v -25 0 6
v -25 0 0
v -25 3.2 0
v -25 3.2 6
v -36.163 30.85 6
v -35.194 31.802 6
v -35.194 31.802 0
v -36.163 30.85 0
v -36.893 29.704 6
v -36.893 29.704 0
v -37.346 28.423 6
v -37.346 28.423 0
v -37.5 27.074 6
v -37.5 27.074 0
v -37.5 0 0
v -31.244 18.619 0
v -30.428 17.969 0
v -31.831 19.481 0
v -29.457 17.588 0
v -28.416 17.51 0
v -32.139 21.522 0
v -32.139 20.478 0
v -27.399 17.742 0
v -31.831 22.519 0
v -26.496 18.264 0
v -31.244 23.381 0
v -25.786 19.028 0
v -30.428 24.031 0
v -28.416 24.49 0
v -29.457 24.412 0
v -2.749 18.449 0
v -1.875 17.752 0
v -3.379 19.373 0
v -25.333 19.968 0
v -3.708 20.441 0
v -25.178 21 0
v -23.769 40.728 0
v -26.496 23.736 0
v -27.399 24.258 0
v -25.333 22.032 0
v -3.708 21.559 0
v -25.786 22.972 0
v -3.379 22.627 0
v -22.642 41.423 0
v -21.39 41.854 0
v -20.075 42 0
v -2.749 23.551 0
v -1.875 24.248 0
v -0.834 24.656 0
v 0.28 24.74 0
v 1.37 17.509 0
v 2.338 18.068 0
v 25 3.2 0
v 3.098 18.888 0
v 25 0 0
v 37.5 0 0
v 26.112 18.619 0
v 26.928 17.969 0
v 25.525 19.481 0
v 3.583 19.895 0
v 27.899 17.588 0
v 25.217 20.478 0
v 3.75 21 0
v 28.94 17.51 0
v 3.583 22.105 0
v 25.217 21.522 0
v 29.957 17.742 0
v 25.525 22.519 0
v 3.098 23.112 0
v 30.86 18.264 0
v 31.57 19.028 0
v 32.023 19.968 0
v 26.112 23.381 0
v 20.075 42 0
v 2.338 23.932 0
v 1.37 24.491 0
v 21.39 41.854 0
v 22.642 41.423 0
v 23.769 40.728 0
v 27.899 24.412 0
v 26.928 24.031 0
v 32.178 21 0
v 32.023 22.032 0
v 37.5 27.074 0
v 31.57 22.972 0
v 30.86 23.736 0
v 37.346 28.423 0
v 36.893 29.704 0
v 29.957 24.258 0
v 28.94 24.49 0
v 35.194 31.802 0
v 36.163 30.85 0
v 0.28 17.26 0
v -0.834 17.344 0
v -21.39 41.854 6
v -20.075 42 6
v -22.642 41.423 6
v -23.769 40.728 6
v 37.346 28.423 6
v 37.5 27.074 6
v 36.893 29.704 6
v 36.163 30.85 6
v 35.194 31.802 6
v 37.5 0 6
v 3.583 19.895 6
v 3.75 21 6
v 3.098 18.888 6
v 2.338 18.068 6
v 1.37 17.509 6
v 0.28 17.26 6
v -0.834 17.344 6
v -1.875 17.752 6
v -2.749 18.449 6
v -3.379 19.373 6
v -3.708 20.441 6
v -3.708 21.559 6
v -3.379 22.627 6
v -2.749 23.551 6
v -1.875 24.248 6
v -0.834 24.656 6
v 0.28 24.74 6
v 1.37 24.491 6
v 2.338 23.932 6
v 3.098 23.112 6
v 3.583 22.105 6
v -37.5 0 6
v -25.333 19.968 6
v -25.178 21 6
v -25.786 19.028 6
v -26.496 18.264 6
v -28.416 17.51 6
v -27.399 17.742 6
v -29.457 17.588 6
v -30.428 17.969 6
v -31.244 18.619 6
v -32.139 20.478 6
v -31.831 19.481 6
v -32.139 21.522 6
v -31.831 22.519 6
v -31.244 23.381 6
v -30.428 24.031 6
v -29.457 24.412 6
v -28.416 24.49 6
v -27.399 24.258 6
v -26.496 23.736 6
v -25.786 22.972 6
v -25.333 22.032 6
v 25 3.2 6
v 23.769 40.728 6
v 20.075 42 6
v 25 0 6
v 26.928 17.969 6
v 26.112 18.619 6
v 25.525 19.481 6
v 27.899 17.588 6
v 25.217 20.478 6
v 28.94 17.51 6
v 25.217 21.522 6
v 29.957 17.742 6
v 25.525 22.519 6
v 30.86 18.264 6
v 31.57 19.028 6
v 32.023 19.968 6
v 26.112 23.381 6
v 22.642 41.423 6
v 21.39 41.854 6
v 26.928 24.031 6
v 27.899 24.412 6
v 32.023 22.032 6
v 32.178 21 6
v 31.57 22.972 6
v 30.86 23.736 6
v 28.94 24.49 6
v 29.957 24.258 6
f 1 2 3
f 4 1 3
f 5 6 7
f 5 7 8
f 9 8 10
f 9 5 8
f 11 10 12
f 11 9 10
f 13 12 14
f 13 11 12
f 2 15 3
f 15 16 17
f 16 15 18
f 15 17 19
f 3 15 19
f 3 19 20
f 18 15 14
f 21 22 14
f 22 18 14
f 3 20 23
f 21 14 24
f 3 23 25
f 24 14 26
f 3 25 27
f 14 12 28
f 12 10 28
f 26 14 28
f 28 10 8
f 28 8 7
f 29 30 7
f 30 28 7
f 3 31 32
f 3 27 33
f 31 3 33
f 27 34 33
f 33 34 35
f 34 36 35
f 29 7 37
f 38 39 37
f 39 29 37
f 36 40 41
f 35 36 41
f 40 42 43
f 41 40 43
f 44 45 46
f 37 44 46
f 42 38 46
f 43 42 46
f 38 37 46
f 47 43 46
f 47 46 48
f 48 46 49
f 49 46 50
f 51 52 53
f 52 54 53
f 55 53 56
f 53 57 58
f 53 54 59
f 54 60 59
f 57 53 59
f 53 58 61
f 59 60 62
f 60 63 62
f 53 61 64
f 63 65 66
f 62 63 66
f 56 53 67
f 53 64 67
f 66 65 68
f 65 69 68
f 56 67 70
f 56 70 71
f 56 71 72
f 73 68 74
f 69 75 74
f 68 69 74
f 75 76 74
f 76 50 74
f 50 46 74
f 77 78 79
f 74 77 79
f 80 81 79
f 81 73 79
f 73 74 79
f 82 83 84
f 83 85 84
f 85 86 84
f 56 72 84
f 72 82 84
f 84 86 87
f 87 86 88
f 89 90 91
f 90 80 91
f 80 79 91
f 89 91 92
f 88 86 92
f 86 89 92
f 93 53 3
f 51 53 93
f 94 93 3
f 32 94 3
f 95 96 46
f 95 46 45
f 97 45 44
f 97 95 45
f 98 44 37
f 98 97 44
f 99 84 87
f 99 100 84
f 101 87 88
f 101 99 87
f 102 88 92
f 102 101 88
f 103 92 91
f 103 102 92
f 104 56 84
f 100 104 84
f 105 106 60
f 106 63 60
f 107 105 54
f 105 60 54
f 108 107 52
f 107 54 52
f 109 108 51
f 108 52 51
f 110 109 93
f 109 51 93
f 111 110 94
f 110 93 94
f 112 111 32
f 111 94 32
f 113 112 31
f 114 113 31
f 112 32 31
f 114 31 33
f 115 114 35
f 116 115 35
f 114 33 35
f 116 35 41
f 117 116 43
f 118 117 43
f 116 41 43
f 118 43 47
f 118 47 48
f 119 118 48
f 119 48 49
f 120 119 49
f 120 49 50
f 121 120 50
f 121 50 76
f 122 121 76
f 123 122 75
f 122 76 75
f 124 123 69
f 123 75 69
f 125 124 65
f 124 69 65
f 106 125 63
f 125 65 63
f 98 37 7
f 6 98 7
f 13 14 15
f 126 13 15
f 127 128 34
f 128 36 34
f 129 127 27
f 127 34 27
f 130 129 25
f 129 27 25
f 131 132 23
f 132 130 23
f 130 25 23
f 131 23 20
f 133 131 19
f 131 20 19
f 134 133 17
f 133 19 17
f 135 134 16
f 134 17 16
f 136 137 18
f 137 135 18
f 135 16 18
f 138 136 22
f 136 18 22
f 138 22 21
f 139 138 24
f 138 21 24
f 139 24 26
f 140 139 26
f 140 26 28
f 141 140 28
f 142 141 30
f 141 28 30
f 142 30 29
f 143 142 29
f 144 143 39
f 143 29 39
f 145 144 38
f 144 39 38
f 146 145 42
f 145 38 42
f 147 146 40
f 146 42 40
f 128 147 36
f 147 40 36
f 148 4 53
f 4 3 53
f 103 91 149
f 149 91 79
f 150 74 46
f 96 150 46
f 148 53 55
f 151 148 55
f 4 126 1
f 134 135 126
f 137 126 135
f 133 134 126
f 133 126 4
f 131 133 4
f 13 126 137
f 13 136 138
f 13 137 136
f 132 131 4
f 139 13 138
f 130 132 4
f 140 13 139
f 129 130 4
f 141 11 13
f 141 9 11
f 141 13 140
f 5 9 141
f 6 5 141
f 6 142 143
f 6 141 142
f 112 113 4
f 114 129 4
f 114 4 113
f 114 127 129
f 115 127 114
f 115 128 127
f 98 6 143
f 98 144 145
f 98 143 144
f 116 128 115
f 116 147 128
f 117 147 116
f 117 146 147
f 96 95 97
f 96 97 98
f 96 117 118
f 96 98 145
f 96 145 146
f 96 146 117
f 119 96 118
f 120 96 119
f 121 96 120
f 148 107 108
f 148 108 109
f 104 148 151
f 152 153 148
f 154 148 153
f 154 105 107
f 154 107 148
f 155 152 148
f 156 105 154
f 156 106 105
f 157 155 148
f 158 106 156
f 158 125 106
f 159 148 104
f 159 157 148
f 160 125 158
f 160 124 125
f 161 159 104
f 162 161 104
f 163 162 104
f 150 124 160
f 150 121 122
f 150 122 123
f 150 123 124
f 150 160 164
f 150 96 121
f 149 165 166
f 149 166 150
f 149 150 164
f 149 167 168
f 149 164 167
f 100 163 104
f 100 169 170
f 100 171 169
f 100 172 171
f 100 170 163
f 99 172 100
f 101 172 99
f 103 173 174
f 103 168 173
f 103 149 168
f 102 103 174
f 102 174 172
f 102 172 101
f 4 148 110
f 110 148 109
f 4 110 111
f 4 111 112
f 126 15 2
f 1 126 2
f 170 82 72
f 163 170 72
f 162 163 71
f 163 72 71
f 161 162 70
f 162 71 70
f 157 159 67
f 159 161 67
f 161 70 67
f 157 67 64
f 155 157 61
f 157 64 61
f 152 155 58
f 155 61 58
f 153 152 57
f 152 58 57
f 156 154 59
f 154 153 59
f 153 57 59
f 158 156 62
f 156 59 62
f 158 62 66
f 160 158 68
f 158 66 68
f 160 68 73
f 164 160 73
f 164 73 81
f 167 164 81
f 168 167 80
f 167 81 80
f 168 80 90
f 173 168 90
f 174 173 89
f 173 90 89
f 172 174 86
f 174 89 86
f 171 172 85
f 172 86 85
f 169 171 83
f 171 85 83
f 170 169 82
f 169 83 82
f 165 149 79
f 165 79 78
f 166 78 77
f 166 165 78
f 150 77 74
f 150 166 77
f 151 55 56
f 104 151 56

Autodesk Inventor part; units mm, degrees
ref_plane "YZ Plane" through (0, 0, 0) normal (1, 0, 0) x (0, 1, 0)
ref_plane "XZ Plane" through (0, 0, 0) normal (0, 1, 0) x (-1, 0, 0)
ref_plane "XY Plane" through (0, 0, 0) normal (0, 0, 1) x (1, 0, 0)
sketch "Sketch1" plane through (0, 0, 0) normal (0, 0, 1) x (1, 0, 0)
  line L0 (37.5, 0) -> (37.5, 30)
  line L1 (37.5, 30) -> (22.1407, 42)
  line L2 (22.1407, 42) -> (-22.1407, 42)
  line L3 (-22.1407, 42) -> (-37.5, 30)
  line L4 (-37.5, 30) -> (-37.5, 0)
  circle A0 centre (-28.678, 21) radius 3.5
  circle A1 centre (28.678, 21) radius 3.5
  circle A2 centre (0, 21) radius 3.75
  line L5 (-37.5, 0) -> (-25, 0)
  line L6 (-25, 0) -> (-25, 3.2)
  line L7 (-25, 3.2) -> (25, 3.2)
  line L8 (25, 3.2) -> (25, 0)
  line L9 (25, 0) -> (37.5, 0)
  line L10 (0, -8.4) -> (0, 50.4) projected
  line L11 (-52.5, 0) -> (52.5, 0) projected
  point P0 (0, 0)
  point P1 (0, 42)
  point P2 (0, 0)
  dimension "d0" = 30
  dimension "d1" = 30
  dimension "d3" = 128
  dimension "d4" = 75
  dimension "d5" = 7
  dimension "d7" = 7
  dimension "d9" = 28.678
  dimension "d10" = 28.678
  dimension "d24" = 7.5
  dimension "d28" = 50
  dimension "d29" = 12.5
  dimension "d30" = 3.2
  dimension "d31" = 37.5
  dimension "d32" = 128
  dimension "d33" = 3.2
  dimension "d34" = 17.8
  dimension "d36" = 44.2814
extrude "Extrusion2" add sketch "Sketch1" along normal blind 6 contours L9 L8 L7 L10 A2 L2 L1 L0 | L10 A2 L7 L6 L5 L4 L3 L2
fillet "Fillet2" radius 6 4 edges at (-22.1407, 42, 3) (22.1407, 42, 3) (37.5, 30, 3) (-37.5, 30, 3)
equation "\"d1\" = d0"
equation "\"d7\" = d5"
equation "\"d10\" = d9"
properties part number "Tope riel final"
